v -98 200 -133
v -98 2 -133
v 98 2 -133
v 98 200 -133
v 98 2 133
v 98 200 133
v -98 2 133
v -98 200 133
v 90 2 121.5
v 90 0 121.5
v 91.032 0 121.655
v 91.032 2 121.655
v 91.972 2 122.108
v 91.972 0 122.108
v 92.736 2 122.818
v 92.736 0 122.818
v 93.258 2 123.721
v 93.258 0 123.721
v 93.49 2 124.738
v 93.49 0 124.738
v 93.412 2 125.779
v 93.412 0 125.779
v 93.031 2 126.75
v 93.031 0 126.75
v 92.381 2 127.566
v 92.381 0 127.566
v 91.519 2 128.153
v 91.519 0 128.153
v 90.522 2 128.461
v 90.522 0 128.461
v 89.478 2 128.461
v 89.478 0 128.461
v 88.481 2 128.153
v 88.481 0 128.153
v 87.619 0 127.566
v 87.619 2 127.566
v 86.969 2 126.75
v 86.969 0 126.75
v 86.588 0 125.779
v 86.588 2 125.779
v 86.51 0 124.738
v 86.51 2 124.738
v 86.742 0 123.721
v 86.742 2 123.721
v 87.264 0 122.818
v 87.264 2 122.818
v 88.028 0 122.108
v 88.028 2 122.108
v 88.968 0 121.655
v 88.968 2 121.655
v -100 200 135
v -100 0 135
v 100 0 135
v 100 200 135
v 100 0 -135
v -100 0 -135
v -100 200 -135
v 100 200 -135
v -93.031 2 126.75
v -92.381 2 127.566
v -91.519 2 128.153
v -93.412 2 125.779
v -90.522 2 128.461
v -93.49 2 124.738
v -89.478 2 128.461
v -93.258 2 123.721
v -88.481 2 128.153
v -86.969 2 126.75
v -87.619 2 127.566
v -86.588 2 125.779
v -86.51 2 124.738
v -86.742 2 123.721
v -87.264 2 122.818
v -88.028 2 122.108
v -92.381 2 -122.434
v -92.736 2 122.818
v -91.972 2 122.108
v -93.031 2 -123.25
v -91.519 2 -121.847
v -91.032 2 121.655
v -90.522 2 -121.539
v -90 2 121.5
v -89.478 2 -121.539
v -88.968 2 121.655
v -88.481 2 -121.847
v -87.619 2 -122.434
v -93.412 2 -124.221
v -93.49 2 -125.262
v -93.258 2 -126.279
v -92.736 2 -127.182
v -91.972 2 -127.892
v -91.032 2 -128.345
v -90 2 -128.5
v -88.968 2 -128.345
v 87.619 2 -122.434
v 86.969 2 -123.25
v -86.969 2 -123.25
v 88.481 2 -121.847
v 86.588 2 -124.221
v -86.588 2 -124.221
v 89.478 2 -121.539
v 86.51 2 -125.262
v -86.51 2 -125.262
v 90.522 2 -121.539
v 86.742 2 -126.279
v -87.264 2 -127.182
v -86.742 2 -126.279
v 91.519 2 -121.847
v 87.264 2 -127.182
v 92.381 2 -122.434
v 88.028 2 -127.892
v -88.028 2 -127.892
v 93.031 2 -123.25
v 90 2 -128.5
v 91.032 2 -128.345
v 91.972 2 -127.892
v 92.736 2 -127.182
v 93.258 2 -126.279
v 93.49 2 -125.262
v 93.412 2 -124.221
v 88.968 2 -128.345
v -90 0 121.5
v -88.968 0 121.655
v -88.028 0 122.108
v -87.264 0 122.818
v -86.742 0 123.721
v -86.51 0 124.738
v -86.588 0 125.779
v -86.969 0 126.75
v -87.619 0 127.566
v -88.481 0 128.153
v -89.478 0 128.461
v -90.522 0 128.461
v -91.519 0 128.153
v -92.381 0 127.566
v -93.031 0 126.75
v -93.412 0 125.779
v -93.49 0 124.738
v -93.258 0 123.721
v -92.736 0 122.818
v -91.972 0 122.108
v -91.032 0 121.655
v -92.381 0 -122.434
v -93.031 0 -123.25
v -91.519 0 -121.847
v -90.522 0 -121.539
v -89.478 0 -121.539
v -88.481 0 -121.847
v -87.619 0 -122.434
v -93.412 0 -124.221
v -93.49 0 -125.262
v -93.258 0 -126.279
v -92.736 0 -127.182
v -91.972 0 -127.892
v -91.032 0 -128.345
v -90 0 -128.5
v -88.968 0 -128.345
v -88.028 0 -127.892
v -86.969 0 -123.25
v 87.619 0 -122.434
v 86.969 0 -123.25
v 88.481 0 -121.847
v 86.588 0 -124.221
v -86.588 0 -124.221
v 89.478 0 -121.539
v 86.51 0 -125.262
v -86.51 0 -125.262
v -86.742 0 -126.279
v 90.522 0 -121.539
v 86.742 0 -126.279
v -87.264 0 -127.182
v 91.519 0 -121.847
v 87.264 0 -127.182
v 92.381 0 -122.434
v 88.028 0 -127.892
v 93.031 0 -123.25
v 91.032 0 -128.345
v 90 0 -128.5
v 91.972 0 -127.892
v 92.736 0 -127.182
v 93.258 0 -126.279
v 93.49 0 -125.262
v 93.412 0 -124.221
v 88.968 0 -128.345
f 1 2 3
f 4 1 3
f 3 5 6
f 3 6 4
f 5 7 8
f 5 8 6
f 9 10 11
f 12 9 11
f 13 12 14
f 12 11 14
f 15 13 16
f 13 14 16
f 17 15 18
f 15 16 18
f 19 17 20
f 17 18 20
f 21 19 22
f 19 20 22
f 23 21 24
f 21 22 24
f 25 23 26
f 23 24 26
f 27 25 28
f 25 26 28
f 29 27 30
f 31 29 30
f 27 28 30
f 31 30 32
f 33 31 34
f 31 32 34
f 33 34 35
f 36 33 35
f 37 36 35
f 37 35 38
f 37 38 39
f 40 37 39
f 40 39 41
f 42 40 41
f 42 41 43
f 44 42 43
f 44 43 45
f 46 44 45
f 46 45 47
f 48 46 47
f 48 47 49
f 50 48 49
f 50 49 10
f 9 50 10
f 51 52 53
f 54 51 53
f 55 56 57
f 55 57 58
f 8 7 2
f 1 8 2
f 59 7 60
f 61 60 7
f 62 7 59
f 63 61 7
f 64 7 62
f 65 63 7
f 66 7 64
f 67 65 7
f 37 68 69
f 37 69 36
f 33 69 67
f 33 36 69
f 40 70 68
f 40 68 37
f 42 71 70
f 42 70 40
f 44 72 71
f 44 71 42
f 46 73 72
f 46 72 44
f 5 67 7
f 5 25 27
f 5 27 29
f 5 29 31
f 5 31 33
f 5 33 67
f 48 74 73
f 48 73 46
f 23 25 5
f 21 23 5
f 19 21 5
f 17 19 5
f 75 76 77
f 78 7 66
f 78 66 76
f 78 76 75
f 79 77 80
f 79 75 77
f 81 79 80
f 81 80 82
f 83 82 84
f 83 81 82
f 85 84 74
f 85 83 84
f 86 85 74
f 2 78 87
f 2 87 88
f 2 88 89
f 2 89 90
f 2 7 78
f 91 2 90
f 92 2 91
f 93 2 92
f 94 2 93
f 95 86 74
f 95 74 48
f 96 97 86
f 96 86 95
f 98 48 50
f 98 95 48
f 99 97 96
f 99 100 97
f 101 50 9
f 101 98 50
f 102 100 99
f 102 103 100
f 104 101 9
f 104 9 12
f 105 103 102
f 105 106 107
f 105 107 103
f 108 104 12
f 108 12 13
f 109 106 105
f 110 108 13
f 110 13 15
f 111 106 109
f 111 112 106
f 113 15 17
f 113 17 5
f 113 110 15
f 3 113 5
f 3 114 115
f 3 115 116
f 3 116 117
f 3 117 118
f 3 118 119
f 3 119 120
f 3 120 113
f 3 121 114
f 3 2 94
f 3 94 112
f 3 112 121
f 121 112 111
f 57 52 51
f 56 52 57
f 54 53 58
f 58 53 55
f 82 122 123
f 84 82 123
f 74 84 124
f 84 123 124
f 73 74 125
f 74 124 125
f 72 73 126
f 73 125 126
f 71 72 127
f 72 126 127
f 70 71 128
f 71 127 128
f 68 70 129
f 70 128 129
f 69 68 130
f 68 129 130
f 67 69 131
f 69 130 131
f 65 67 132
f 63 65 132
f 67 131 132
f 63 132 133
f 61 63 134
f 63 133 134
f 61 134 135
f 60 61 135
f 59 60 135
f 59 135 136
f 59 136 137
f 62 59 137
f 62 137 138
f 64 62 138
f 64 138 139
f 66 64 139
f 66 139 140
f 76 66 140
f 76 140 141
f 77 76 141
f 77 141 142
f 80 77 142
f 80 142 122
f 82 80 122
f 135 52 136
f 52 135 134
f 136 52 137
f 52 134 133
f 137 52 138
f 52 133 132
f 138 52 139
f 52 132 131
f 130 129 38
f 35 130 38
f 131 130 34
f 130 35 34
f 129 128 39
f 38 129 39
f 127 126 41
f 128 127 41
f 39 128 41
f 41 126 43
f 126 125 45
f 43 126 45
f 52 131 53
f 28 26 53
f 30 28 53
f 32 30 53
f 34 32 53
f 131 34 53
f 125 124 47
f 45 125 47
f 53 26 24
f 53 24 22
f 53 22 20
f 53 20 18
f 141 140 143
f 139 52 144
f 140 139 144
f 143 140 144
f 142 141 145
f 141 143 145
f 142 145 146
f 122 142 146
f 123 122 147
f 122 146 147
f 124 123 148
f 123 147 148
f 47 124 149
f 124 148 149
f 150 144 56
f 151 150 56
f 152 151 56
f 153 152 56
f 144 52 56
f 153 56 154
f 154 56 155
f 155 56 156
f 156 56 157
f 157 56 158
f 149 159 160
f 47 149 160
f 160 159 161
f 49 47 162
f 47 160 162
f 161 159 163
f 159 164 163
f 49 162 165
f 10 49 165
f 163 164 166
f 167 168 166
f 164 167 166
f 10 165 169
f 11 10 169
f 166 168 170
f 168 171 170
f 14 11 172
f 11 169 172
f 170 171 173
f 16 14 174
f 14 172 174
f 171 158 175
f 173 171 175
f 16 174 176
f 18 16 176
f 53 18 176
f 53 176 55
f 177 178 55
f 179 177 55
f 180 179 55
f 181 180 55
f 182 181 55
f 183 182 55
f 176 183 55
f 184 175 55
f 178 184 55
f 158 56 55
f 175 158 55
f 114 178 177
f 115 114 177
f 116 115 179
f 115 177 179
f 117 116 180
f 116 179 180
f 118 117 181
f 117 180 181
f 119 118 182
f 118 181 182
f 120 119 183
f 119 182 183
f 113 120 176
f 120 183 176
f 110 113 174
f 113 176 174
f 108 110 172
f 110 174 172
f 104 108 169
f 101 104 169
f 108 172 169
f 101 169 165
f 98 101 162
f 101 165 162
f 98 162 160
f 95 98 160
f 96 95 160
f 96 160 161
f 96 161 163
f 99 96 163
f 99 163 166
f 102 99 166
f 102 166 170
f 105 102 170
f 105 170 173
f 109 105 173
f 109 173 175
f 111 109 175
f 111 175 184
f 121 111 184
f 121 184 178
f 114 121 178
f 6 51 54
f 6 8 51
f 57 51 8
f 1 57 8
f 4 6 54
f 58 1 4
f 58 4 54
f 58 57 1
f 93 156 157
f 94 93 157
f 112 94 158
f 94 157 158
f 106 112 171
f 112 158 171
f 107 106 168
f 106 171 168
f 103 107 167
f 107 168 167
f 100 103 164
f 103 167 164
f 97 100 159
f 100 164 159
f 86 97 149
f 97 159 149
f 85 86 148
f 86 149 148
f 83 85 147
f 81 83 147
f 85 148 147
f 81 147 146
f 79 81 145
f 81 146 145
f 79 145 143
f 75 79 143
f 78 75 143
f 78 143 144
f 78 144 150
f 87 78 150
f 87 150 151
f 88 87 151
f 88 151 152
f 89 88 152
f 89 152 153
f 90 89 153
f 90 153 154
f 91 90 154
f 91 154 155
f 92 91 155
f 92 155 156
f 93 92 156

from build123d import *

# Parameters (mm, degrees)
SKETCH_1_W          = 200
SKETCH_1_H          = 270
EXTRUDE_1_DEPTH     = 200
SHELL_1_T           = -2
SKETCH_2_R          = 3.5
CUT_EXTRUDE_1_DEPTH = 10


with BuildPart() as part:
    # 草图1 → 凸台-拉伸1 (new body)
    with BuildSketch(Plane(origin=(0, 0, 0), x_dir=(1, 0, 0), z_dir=(0, 1, 0))):
        Rectangle(SKETCH_1_W, SKETCH_1_H)
    extrude(amount=EXTRUDE_1_DEPTH)

    # 抽壳1
    shell_1_openings = [part.faces().sort_by_distance(p)[0] for p in [
        (0, 200, 0),
    ]]
    offset(amount=SHELL_1_T, openings=shell_1_openings, kind=Kind.INTERSECTION)

    # 草图2 → 切除-拉伸1 (cut)
    with BuildSketch(Plane(origin=(0, 0, 0), x_dir=(-1, 0, 0), z_dir=(0, -1, 0))):
        with Locations(Location((90, -125, 0), (0, 0, 90))):
            Circle(SKETCH_2_R)
        with Locations(Location((-90, -125, 0), (0, 0, 90))):
            Circle(SKETCH_2_R)
        with Locations(Location((-90, 125, 0), (0, 0, 90))):
            Circle(SKETCH_2_R)
        with Locations(Location((90, 125, 0), (0, 0, 90))):
            Circle(SKETCH_2_R)
    extrude(amount=-CUT_EXTRUDE_1_DEPTH, mode=Mode.SUBTRACT)


solid = part.part
